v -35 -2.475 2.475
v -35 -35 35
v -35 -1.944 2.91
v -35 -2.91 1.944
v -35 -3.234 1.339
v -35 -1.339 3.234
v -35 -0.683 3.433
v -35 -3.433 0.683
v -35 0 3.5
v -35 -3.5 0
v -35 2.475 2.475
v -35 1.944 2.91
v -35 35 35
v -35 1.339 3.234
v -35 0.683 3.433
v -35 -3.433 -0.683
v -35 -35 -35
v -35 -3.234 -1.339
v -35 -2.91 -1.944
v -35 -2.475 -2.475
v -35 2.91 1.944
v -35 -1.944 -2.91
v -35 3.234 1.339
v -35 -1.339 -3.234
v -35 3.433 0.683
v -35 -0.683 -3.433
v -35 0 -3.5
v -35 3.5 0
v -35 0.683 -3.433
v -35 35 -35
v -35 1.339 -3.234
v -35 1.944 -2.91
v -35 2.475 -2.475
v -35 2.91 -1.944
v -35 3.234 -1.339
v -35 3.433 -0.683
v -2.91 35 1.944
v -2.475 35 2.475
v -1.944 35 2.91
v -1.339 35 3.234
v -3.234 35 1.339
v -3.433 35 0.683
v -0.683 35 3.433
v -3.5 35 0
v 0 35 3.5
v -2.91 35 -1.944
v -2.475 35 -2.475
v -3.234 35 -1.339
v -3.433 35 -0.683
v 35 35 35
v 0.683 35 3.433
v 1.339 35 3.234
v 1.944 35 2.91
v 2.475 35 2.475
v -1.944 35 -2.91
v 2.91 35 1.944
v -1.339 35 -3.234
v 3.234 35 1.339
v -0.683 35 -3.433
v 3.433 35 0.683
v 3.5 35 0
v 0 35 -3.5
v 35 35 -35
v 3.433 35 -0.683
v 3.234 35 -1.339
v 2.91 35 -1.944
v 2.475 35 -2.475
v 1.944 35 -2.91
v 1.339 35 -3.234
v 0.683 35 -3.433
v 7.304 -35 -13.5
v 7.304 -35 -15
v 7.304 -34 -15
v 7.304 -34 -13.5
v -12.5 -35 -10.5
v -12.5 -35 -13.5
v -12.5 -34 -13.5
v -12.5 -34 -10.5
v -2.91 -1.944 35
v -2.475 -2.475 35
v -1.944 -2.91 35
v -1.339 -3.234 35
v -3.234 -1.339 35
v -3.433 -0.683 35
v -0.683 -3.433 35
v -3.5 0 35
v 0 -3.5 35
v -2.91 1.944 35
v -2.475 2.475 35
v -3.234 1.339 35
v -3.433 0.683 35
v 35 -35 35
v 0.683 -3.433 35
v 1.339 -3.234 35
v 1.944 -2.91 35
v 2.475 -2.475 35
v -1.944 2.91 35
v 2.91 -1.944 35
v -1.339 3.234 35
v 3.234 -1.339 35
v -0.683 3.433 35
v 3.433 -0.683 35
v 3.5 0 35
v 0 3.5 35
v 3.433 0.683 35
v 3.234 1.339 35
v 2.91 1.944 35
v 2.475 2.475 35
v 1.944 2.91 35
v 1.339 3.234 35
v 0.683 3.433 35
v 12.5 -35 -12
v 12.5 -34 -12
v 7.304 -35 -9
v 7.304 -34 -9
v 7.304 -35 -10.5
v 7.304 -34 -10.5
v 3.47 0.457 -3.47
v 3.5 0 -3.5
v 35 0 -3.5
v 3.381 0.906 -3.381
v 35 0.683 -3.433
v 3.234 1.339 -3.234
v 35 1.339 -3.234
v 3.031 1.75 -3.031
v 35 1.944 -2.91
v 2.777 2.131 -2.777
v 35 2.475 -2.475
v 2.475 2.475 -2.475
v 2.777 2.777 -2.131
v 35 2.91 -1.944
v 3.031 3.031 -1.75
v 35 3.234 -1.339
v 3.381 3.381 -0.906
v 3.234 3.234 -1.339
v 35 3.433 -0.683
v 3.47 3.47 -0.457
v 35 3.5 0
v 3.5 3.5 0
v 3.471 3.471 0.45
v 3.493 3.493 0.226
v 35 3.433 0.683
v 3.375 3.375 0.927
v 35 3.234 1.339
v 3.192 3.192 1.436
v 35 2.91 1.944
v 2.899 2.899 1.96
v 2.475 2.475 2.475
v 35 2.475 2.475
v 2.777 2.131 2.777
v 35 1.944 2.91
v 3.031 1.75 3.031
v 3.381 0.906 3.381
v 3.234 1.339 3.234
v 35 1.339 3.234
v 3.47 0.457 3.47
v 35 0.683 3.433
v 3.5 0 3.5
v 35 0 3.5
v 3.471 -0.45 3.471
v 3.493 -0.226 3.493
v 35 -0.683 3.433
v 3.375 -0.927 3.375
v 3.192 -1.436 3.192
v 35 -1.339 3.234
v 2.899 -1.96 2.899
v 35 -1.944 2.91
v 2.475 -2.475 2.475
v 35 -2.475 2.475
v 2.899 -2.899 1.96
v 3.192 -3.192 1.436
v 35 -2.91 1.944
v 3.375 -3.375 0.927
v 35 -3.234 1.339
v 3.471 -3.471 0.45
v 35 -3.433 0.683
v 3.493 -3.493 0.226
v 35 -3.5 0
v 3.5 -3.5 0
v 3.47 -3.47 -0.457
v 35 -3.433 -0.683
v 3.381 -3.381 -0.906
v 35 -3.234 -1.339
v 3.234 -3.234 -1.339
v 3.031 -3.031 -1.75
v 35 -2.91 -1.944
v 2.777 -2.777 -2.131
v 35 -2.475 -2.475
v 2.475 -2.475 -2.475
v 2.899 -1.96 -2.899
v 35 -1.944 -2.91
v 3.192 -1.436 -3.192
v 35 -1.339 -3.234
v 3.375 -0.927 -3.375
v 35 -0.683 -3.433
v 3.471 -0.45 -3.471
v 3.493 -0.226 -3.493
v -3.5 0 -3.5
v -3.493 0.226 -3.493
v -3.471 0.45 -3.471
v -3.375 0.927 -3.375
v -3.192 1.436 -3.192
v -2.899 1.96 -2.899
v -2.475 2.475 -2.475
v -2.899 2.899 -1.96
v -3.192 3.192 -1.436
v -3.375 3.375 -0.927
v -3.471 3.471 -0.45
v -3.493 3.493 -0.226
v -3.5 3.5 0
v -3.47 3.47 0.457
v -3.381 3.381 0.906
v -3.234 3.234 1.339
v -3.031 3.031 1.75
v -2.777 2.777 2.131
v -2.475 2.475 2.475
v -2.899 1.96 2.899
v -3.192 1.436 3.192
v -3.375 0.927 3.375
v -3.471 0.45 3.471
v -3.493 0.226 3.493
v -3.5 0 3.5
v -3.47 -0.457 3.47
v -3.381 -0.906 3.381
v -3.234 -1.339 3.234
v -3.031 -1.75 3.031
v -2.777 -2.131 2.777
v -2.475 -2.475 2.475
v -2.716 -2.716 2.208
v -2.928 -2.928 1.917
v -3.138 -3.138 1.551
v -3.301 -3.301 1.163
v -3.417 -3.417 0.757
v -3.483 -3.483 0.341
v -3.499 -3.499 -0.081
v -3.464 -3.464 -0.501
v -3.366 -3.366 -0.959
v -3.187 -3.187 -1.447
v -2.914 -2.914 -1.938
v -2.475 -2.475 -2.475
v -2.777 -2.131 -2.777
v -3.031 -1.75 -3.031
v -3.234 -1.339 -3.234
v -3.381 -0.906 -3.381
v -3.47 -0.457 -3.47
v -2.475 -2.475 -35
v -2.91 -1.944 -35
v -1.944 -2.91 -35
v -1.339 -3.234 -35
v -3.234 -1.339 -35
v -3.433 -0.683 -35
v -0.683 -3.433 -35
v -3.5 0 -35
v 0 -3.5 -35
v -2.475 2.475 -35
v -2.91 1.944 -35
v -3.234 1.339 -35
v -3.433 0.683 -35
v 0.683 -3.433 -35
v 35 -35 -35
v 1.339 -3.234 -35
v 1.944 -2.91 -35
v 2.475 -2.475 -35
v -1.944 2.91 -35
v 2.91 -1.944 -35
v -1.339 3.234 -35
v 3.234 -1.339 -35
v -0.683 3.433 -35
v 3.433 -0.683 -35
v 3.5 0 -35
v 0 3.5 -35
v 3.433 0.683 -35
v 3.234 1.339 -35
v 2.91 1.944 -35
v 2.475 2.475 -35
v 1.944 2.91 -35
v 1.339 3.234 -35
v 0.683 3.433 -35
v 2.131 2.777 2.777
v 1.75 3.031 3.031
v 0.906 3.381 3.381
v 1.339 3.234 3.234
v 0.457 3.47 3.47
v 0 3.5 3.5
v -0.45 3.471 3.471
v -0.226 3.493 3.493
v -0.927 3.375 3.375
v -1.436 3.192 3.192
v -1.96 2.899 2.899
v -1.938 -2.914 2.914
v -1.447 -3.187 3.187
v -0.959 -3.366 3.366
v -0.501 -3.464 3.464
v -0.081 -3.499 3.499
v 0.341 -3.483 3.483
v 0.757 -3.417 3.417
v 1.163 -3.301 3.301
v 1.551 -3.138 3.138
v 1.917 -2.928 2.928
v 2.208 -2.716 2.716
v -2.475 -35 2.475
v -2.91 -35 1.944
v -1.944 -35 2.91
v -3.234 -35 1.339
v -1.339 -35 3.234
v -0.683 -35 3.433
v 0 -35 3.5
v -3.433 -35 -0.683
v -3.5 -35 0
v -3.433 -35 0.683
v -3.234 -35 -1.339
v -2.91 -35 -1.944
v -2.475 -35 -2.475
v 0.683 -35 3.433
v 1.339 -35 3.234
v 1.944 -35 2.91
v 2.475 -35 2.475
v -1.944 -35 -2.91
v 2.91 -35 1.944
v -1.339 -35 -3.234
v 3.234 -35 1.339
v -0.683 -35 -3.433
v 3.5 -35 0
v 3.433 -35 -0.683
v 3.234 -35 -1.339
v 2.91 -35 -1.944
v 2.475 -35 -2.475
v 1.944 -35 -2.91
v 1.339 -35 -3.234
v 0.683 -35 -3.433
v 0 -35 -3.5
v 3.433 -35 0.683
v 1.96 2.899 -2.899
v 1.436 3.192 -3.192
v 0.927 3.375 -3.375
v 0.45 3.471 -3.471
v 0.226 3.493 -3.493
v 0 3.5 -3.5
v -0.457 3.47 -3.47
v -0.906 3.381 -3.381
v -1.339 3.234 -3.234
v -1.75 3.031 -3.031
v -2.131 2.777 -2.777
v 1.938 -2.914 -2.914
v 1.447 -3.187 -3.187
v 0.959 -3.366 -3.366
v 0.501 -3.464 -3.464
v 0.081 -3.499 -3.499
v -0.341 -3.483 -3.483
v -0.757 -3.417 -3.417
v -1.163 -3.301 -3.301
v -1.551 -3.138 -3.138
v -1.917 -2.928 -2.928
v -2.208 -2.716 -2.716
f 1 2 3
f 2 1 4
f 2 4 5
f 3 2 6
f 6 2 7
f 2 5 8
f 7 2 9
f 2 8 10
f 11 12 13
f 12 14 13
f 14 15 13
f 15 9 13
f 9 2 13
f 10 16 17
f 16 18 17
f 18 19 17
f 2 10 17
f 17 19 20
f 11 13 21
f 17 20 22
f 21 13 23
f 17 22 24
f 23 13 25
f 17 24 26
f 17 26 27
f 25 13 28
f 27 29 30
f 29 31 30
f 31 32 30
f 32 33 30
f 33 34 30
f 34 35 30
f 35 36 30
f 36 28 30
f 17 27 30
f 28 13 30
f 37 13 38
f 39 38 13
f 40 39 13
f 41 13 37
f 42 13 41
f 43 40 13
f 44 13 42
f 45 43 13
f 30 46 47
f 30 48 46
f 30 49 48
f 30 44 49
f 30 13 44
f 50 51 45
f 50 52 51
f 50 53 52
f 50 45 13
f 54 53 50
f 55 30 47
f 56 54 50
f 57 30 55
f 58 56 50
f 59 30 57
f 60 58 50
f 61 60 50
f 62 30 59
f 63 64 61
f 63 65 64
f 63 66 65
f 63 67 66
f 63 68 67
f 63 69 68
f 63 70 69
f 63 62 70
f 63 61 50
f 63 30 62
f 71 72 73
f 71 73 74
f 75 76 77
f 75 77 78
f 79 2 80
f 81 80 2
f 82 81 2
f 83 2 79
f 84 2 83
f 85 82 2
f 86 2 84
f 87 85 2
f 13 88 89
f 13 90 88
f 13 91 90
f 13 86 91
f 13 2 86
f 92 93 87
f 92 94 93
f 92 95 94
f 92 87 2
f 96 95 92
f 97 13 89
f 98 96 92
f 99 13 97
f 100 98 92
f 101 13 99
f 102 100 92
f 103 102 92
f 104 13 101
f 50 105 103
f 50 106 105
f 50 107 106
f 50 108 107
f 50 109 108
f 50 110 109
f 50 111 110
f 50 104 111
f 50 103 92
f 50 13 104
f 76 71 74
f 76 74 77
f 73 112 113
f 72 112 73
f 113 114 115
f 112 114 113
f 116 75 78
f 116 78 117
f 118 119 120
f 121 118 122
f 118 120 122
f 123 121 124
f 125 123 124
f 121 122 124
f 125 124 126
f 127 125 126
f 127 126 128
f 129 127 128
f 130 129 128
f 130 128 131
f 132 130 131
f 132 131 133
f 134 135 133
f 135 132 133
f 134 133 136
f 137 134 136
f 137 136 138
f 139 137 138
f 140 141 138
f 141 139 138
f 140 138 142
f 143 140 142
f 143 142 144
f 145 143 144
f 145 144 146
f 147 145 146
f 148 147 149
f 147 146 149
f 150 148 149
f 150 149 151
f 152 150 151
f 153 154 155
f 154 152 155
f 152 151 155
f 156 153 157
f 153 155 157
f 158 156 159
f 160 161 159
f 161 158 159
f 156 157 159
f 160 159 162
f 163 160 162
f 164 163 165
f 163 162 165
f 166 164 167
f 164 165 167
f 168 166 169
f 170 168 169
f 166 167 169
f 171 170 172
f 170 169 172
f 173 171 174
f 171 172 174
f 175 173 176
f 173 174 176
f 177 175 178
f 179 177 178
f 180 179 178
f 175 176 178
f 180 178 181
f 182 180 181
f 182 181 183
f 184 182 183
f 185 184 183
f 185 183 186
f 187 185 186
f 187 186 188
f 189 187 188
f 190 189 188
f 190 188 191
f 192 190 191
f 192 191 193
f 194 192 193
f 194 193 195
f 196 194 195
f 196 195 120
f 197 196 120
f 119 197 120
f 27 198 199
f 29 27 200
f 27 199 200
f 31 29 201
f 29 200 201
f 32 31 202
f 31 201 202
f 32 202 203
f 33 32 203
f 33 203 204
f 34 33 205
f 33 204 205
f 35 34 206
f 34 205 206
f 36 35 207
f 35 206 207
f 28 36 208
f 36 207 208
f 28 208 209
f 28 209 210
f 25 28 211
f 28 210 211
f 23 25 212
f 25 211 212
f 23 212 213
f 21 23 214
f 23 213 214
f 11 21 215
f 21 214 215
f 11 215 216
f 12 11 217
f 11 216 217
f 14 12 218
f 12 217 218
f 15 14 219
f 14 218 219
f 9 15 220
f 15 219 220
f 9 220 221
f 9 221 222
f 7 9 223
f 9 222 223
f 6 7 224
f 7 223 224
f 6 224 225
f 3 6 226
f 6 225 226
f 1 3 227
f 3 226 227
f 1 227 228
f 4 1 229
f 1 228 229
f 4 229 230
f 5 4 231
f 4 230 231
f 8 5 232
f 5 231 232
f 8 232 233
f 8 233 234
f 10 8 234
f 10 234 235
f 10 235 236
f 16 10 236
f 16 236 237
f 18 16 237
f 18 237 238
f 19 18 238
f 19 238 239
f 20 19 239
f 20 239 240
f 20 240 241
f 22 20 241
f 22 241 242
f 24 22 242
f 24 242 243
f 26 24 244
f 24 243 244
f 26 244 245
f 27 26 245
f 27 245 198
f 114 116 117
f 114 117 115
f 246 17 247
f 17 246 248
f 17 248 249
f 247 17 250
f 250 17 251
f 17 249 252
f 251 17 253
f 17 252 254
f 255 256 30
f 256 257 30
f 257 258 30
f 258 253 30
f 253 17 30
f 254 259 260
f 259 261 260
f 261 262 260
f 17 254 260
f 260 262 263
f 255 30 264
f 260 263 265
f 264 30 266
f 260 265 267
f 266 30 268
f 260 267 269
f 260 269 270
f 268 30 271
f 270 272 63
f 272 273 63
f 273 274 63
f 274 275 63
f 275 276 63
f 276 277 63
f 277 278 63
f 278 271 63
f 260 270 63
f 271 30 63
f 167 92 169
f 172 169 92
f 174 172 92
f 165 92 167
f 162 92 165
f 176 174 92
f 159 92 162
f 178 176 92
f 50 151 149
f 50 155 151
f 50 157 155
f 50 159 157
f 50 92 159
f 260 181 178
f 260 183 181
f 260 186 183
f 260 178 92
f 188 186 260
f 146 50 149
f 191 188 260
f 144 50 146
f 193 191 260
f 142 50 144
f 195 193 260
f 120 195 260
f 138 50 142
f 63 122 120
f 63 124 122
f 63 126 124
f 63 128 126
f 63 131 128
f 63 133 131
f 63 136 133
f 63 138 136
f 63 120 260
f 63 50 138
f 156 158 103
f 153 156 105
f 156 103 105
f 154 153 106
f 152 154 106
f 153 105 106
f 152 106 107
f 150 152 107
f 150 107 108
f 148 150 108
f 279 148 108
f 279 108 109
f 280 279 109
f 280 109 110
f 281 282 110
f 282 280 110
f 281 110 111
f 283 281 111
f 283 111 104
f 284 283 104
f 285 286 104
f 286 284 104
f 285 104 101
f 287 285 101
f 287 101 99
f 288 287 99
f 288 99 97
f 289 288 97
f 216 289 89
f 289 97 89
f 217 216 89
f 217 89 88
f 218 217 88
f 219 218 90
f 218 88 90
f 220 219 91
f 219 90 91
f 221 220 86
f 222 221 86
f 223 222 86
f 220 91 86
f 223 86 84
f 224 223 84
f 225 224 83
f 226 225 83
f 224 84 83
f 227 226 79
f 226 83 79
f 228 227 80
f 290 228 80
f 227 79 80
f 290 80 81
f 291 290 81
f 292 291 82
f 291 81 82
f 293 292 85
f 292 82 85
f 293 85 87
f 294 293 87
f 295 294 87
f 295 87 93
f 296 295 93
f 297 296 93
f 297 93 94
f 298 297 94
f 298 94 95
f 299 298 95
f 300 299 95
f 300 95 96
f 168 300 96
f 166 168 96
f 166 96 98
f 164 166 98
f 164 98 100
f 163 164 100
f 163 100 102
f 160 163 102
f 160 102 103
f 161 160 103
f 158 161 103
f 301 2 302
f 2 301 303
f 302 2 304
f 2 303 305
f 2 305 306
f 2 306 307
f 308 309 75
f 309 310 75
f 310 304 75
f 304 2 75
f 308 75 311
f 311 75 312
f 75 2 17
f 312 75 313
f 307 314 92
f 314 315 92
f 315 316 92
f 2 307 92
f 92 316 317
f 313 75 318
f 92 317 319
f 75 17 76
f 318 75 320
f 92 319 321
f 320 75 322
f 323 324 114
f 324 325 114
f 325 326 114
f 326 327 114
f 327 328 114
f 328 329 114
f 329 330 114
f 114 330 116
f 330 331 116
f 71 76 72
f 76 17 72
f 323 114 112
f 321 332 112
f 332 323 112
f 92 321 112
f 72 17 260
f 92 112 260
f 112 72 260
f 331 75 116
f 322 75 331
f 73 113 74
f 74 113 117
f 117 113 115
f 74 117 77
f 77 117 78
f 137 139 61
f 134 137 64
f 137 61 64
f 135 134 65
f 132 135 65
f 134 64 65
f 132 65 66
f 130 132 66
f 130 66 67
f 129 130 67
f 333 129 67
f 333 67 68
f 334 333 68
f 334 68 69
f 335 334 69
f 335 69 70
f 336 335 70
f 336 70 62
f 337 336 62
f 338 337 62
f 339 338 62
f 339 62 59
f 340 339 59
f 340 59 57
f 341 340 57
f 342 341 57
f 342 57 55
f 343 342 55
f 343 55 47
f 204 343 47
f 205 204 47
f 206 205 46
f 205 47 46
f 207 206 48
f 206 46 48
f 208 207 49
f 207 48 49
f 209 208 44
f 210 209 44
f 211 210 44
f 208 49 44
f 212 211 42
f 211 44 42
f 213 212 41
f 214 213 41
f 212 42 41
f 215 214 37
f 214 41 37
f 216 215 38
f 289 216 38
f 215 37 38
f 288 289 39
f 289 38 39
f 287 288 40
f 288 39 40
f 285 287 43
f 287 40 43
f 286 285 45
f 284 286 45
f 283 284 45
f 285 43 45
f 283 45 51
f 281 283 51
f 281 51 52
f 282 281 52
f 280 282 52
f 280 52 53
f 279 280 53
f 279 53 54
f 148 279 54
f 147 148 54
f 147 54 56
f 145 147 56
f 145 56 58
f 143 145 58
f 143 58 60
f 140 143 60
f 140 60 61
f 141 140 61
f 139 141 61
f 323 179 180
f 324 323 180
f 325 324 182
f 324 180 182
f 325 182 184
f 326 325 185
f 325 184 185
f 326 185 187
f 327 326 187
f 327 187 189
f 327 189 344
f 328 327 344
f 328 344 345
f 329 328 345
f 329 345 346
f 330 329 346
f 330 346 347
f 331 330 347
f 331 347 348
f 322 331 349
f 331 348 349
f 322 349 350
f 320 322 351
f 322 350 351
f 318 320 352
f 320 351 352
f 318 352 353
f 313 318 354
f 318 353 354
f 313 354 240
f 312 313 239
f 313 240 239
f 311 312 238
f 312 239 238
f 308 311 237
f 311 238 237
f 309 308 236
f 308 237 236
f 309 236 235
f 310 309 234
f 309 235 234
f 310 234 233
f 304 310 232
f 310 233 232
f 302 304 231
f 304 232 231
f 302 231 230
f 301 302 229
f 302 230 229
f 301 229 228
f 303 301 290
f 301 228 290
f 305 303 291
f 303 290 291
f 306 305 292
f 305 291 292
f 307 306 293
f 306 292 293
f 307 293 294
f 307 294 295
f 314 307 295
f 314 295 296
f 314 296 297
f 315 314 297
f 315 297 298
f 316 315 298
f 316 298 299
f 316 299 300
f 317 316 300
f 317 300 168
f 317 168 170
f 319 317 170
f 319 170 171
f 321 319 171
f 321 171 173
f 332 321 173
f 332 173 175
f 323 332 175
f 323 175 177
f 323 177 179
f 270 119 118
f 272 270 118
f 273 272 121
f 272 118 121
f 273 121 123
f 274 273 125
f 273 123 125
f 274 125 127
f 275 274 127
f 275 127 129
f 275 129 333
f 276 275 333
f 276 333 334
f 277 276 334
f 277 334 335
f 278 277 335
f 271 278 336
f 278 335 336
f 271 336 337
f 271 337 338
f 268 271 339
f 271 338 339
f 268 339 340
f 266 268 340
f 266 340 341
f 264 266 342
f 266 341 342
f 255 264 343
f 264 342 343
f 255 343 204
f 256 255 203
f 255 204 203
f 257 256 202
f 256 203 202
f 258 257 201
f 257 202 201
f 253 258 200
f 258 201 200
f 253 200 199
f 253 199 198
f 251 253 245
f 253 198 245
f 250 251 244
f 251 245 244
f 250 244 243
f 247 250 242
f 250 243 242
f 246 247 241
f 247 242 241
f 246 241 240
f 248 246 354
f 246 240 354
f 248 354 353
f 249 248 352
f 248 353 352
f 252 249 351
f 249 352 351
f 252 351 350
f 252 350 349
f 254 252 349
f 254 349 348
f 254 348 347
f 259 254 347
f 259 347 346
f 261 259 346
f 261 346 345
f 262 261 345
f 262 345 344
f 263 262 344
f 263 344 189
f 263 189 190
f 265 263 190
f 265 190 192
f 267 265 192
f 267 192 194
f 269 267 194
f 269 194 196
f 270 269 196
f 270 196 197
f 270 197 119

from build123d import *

# Parameters (mm, degrees)
SKETCH1_W           = 70
SKETCH1_H           = 70
BOSS_EXTRUDE1_DEPTH = 35
SKETCH2_R           = 3.5
CUT_EXTRUDE1_DEPTH  = 71
SKETCH3_R           = 3.5
CUT_EXTRUDE2_DEPTH  = 71
SKETCH4_R           = 3.5
CUT_EXTRUDE3_DEPTH  = 71
CUT_EXTRUDE4_DEPTH  = 1


with BuildPart() as part:
    # Sketch1 → Boss-Extrude1 (new body, symmetric)
    with BuildSketch(Plane(origin=(0, 0, 0), x_dir=(1, 0, 0), z_dir=(0, 1, 0))):
        Rectangle(SKETCH1_W, SKETCH1_H)
    extrude(amount=BOSS_EXTRUDE1_DEPTH, both=True)

    # Sketch2 → Cut-Extrude1 (cut, through all)
    with BuildSketch(Plane(origin=(0, 35, 0), x_dir=(1, 0, 0), z_dir=(0, 1, 0))):
        Circle(SKETCH2_R)
    extrude(amount=-CUT_EXTRUDE1_DEPTH, mode=Mode.SUBTRACT)

    # Sketch3 → Cut-Extrude2 (cut, through all)
    with BuildSketch(Plane.XY.offset(35)):
        Circle(SKETCH3_R)
    extrude(amount=-CUT_EXTRUDE2_DEPTH, mode=Mode.SUBTRACT)

    # Sketch4 → Cut-Extrude3 (cut, through all)
    with BuildSketch(Plane(origin=(35, 0, 0), x_dir=(0, 0, -1), z_dir=(1, 0, 0))):
        Circle(SKETCH4_R)
    extrude(amount=-CUT_EXTRUDE3_DEPTH, mode=Mode.SUBTRACT)

    # Sketch5 → Cut-Extrude4 (cut)
    with BuildSketch(Plane.XZ.offset(35)):
        Polygon((7.303847577, -10.5), (7.303847577, -9), (12.5, -12), (7.303847577, -15), (7.303847577, -13.5), (-12.5, -13.5), (-12.5, -10.5), align=None)
    extrude(amount=-CUT_EXTRUDE4_DEPTH, mode=Mode.SUBTRACT)


solid = part.part
